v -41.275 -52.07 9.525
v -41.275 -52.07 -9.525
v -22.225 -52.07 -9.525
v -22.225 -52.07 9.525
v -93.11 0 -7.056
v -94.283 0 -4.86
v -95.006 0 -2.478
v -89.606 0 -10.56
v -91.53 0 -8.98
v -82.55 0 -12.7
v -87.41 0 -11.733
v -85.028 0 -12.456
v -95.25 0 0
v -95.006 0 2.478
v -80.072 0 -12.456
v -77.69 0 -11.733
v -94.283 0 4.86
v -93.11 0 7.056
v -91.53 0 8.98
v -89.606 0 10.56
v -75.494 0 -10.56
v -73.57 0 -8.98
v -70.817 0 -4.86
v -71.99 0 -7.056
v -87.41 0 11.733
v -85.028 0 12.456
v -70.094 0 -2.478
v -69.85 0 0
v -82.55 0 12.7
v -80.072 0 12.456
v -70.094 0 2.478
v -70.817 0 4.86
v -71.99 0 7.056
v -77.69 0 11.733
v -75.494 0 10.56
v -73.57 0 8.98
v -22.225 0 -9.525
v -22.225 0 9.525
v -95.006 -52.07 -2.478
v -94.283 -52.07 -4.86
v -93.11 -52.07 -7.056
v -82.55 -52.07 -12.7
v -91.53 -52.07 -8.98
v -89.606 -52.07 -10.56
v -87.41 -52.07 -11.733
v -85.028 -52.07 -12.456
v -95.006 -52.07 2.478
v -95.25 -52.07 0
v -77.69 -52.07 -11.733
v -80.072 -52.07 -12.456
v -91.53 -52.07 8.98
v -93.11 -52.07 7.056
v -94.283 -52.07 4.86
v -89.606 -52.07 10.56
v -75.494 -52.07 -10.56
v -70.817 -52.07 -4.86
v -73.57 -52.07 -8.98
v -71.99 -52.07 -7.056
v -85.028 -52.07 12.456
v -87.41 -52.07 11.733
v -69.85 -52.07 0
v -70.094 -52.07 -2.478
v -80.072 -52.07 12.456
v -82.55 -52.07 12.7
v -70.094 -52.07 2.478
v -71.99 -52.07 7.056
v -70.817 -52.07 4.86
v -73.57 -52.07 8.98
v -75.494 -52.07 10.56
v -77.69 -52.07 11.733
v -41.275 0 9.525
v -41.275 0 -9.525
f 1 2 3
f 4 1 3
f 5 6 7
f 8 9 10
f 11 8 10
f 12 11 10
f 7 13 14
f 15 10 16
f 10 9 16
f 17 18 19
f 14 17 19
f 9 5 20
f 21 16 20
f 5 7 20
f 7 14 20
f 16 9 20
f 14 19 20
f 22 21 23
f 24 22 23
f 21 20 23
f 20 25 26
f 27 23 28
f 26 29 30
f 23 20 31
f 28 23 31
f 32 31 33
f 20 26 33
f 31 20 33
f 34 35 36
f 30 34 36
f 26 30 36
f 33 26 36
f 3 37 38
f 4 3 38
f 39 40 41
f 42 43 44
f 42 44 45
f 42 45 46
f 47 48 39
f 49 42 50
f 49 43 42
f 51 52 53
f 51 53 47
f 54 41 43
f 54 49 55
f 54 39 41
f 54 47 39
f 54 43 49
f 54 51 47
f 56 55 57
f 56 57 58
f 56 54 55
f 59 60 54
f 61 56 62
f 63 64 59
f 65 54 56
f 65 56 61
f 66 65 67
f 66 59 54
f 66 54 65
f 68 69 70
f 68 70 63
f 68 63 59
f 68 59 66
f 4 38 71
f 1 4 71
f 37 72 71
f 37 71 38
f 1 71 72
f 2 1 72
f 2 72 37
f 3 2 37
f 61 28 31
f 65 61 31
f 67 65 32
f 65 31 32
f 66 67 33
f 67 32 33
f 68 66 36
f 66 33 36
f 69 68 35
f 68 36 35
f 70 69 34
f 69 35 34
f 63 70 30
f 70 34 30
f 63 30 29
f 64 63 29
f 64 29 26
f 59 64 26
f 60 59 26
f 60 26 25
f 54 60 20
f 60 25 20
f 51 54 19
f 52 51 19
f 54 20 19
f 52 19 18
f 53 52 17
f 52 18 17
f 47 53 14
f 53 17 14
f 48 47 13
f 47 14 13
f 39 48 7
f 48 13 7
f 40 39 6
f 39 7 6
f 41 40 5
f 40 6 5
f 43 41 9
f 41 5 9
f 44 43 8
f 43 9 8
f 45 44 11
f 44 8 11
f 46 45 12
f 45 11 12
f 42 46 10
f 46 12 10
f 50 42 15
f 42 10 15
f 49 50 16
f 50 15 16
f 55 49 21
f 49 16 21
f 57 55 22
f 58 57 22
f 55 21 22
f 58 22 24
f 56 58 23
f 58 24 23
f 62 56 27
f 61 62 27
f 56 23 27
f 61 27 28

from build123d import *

# Parameters (mm, degrees)
F0_R     = 12.7
F1_DEPTH = 52.07


with BuildPart() as f1:
    # F0 (on Front) → F1 (new body)
    with BuildSketch(Plane.XZ):
        with Locations((-82.55, 0)):
            Circle(F0_R)
        Polygon((-22.225, -9.525), (-22.225, 9.525), (-41.275, 9.525), (-41.275, 0), (-41.275, -9.525), align=None)
    extrude(amount=F1_DEPTH)


solid = f1.part
